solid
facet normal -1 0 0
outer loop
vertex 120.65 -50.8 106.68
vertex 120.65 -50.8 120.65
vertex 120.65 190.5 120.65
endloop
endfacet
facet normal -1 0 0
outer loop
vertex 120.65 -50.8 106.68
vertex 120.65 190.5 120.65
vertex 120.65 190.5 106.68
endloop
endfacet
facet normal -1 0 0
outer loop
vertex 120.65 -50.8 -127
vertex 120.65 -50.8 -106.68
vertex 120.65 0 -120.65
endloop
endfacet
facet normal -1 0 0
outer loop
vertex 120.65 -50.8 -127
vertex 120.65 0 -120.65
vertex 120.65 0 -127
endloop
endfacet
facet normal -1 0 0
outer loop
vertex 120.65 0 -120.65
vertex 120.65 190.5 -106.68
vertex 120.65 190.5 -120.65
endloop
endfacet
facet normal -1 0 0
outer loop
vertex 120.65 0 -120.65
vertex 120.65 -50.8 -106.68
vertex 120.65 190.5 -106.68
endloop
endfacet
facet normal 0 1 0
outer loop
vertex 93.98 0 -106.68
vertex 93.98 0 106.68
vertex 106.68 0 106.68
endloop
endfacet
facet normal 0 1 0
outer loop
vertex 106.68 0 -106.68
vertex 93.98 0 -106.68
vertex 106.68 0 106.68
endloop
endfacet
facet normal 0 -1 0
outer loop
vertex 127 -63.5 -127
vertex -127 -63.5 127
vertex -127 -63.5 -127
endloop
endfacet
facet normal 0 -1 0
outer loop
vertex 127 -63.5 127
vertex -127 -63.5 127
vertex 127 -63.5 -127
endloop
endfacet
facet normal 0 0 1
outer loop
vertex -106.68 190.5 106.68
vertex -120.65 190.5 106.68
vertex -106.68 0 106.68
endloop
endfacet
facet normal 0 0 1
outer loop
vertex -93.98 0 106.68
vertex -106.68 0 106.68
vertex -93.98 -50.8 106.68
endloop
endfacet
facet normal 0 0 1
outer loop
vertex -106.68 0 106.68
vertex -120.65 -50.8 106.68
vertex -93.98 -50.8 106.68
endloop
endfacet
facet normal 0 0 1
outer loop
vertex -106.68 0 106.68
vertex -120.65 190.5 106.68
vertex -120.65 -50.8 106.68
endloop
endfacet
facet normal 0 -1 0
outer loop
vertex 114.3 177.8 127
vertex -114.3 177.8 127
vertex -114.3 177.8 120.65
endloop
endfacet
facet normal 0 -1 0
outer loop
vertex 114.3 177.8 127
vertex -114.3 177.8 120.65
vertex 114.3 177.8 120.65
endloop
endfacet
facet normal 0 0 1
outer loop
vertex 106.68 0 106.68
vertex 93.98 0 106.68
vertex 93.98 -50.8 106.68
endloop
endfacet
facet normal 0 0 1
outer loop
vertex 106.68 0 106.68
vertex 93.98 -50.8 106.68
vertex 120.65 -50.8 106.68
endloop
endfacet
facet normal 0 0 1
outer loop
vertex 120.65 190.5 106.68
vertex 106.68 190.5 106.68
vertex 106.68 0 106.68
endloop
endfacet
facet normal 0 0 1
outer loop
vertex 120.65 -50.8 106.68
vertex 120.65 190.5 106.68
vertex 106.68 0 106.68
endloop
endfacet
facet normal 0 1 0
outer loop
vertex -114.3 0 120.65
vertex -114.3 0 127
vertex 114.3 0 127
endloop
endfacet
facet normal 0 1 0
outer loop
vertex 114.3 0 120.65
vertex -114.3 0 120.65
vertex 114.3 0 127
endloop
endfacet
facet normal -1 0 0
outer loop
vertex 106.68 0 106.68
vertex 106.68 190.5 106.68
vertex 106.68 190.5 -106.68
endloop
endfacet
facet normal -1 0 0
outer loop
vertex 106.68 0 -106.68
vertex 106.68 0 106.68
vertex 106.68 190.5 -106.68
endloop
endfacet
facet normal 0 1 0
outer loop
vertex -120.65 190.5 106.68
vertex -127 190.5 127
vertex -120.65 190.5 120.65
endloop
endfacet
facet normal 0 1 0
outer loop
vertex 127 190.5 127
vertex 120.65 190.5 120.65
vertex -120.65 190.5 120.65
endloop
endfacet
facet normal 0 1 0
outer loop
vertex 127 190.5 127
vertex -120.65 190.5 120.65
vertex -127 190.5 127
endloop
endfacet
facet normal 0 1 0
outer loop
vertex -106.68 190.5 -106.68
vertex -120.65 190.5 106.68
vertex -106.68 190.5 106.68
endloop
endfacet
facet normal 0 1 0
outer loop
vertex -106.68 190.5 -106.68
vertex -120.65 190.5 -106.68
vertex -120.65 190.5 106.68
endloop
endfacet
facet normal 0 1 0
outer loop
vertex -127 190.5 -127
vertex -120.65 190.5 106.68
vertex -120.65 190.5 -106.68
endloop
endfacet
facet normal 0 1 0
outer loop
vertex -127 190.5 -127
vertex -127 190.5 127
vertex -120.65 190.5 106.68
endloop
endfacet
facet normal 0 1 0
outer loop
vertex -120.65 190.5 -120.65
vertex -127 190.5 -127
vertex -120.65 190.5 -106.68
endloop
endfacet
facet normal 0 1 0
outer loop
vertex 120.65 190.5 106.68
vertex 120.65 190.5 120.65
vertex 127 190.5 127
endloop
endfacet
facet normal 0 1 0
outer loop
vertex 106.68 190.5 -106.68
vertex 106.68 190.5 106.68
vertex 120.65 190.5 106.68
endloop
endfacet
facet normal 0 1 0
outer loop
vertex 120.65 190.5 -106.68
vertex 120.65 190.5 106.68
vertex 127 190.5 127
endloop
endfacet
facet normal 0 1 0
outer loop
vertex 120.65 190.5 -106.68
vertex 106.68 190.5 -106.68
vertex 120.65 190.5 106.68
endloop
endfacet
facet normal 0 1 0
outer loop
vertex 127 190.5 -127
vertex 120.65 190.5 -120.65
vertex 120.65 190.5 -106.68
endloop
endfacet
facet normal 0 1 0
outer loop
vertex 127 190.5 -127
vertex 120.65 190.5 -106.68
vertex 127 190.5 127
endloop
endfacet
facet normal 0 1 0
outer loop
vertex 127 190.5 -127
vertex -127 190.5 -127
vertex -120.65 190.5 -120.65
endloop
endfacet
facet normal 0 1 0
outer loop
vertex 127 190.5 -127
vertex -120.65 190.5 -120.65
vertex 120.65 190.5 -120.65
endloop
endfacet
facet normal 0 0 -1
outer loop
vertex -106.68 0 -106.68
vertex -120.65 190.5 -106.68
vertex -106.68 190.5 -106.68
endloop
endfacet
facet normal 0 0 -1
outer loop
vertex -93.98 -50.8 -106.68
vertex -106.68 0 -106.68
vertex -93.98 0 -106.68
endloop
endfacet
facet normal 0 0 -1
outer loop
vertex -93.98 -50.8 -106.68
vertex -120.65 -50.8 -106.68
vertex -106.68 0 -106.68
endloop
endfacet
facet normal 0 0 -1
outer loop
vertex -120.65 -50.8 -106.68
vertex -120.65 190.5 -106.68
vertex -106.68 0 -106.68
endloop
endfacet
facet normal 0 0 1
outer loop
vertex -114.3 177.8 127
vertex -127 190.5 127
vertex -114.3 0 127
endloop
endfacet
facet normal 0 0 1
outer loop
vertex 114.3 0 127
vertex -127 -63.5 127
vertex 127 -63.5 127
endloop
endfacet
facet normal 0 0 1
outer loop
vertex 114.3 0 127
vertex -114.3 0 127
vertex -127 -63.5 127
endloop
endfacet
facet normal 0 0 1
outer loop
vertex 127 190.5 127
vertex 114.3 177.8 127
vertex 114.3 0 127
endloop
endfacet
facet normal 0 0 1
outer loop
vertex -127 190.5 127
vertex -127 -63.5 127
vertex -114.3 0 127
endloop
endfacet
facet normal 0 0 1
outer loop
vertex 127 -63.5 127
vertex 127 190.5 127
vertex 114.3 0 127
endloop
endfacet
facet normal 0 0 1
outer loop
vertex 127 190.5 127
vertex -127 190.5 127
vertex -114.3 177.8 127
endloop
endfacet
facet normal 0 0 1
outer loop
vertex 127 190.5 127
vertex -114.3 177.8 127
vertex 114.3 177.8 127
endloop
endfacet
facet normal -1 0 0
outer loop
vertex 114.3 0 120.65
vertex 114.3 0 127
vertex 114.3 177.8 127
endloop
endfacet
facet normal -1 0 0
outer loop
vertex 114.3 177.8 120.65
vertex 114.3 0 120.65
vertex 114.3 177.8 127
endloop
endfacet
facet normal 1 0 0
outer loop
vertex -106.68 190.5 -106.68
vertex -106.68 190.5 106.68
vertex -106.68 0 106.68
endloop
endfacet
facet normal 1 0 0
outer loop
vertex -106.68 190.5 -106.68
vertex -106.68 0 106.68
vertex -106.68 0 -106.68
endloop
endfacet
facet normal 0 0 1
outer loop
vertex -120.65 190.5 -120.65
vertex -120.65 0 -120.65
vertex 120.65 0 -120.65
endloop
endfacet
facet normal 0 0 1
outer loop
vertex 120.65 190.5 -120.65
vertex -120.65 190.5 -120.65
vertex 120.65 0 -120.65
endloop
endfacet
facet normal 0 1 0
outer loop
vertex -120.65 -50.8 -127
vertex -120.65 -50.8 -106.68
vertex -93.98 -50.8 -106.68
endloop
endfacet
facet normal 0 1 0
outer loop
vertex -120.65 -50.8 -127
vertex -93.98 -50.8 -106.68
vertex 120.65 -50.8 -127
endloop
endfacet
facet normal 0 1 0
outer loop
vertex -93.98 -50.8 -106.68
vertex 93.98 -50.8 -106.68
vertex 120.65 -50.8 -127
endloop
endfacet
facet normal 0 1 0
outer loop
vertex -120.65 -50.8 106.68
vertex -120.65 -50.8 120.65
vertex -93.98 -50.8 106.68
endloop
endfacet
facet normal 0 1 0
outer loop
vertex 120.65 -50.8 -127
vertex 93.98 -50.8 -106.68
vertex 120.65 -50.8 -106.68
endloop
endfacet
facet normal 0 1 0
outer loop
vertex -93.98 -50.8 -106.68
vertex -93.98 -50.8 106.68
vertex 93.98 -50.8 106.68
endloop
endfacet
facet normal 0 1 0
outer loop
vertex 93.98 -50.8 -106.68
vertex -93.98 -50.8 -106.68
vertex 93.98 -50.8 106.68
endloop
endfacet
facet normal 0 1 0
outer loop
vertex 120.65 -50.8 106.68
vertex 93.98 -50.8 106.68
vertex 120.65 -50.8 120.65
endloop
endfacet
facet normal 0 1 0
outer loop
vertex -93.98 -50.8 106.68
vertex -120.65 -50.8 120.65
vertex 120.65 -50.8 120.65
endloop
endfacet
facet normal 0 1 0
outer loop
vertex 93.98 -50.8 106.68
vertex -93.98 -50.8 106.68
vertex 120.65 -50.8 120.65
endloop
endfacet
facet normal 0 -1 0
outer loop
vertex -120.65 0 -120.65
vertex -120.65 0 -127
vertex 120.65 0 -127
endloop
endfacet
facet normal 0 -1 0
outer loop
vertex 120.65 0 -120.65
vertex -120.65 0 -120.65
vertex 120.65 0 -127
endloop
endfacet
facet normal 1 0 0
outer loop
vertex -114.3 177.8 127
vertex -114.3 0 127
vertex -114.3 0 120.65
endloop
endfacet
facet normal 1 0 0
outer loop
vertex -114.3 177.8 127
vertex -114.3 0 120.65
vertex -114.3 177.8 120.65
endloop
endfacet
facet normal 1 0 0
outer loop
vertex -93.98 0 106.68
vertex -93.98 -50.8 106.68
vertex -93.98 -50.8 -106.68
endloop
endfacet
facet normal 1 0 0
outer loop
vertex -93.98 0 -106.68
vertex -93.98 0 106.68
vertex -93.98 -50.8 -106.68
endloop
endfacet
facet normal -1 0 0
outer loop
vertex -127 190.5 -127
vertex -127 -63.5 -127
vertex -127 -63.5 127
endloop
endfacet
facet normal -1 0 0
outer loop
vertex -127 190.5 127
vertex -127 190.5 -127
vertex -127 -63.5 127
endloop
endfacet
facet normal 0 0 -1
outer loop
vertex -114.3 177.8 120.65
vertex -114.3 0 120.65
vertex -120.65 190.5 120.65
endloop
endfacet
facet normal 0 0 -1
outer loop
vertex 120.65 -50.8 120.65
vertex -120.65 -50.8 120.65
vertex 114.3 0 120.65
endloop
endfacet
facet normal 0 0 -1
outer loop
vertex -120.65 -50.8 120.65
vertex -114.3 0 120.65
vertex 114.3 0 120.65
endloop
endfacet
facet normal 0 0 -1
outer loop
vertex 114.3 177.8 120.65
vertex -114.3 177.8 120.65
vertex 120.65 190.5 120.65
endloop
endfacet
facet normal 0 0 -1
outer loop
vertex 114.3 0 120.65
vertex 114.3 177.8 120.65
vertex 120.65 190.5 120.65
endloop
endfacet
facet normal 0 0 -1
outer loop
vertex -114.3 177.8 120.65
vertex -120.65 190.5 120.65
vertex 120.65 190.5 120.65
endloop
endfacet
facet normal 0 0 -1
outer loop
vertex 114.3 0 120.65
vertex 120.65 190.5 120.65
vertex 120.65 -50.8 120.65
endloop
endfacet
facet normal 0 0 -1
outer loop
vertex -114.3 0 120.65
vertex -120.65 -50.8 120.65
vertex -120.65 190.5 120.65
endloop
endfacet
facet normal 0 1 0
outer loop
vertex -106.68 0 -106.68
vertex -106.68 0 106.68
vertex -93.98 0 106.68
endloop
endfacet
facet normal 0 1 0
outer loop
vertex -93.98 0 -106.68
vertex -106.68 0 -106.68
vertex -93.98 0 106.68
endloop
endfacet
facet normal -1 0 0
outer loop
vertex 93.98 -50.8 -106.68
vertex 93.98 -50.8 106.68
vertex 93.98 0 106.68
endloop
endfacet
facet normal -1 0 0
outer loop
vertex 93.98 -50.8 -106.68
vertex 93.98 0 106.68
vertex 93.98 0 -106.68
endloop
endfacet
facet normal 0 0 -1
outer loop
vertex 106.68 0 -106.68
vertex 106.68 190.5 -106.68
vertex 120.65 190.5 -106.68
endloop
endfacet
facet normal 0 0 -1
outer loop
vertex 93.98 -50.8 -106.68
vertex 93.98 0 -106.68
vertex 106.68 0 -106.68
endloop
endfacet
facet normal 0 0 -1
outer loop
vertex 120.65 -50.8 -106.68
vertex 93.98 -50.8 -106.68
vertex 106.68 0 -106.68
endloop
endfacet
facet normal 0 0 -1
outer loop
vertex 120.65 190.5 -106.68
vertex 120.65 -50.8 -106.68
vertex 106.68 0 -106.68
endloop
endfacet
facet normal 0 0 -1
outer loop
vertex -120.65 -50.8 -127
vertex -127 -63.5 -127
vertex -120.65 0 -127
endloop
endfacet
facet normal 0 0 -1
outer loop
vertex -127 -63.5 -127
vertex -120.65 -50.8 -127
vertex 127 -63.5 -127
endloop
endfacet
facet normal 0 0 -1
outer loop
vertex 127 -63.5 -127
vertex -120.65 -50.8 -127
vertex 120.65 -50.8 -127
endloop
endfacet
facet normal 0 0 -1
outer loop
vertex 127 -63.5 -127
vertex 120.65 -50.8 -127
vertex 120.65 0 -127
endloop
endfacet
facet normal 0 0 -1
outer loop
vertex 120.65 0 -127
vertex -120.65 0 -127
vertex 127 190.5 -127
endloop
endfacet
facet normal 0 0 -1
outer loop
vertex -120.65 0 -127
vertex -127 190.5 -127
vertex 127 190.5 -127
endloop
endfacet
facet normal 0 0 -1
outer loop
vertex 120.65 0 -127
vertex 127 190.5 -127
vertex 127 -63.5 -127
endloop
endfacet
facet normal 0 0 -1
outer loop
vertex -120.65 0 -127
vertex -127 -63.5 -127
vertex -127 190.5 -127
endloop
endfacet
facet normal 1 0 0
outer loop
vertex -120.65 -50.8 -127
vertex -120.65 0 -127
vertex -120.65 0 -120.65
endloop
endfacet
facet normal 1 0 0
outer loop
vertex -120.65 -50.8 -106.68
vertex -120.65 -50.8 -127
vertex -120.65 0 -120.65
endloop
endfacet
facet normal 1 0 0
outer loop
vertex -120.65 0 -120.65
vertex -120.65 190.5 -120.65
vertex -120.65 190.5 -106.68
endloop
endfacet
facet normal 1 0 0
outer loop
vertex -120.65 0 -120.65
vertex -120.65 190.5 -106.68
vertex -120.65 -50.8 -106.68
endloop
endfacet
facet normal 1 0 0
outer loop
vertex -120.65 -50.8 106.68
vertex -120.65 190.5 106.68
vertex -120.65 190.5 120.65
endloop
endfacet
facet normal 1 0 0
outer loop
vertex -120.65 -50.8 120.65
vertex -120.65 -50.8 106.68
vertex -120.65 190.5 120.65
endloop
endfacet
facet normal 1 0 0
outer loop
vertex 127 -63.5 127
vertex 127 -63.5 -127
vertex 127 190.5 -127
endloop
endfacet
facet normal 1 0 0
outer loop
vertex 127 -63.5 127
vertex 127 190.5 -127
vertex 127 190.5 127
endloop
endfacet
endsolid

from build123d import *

# Parameters (mm, degrees)
SKETCH1_W           = 254
SKETCH1_H           = 254
BOSS_EXTRUDE1_DEPTH = 190.5
BOSS_EXTRUDE2_DEPTH = 50.8
SKETCH5_W           = 254
SKETCH5_H           = 254
BOSS_EXTRUDE3_DEPTH = 12.7
SKETCH6_W           = 228.6
SKETCH6_H           = 177.8
CUT_EXTRUDE1_DEPTH  = 12.7
SKETCH1_4_W         = 13.97
SKETCH1_4_H         = 213.36
BOSS_EXTRUDE5_DEPTH = 50.8
SKETCH8_W           = 12.7
SKETCH8_H           = 213.36
BOSS_EXTRUDE6_DEPTH = 50.8


with BuildPart() as part:
    # Sketch1 → Boss-Extrude1 (new body)
    with BuildSketch(Plane(origin=(0, 0, 0), x_dir=(1, 0, 0), z_dir=(0, 1, 0))):
        Rectangle(SKETCH1_W, SKETCH1_H)
        Polygon((120.65, -120.65), (-120.65, -120.65), (-120.65, -106.68), (-106.68, -106.68), (-106.68, 106.68), (-120.65, 106.68), (-120.65, 120.65), (120.65, 120.65), (120.65, 106.68), (106.68, 106.68), (106.68, -106.68), (120.65, -106.68), align=None, mode=Mode.SUBTRACT)
    extrude(amount=BOSS_EXTRUDE1_DEPTH)

    # Sketch4 → Boss-Extrude2 (add)
    with BuildSketch(Plane.XZ):
        Polygon((-127, 127), (-127, -127), (-120.65, -127), (-120.65, -120.65), (-120.65, -106.68), (-120.65, 106.68), (-120.65, 120.65), (120.65, 120.65), (120.65, 106.68), (120.65, -106.68), (120.65, -120.65), (120.65, -127), (127, -127), (127, 127), align=None)
    extrude(amount=BOSS_EXTRUDE2_DEPTH)

    # Sketch5 → Boss-Extrude3 (add)
    with BuildSketch(Plane.XZ.offset(50.8)):
        Rectangle(SKETCH5_W, SKETCH5_H)
    extrude(amount=BOSS_EXTRUDE3_DEPTH)

    # Sketch6 → Cut-Extrude1 (cut)
    with BuildSketch(Plane.XY.offset(127)):
        with Locations((0, 88.9)):
            Rectangle(SKETCH6_W, SKETCH6_H)
    extrude(amount=-CUT_EXTRUDE1_DEPTH, mode=Mode.SUBTRACT)

    # Sketch1<4> → Boss-Extrude5 (add)
    with BuildSketch(Plane(origin=(0, 0, 0), x_dir=(1, 0, 0), z_dir=(0, 1, 0))):
        with Locations((-113.665, 0)):
            Rectangle(SKETCH1_4_W, SKETCH1_4_H)
        with Locations((113.665, 0)):
            Rectangle(SKETCH1_4_W, SKETCH1_4_H)
    extrude(amount=-BOSS_EXTRUDE5_DEPTH)

    # Sketch8 → Boss-Extrude6 (add)
    with BuildSketch(Plane(origin=(0, -50.8, 0), x_dir=(1, 0, 0), z_dir=(0, 1, 0))):
        with Locations((-100.33, 0)):
            Rectangle(SKETCH8_W, SKETCH8_H)
        with Locations((100.33, 0)):
            Rectangle(SKETCH8_W, SKETCH8_H)
    extrude(amount=BOSS_EXTRUDE6_DEPTH)


solid = part.part
